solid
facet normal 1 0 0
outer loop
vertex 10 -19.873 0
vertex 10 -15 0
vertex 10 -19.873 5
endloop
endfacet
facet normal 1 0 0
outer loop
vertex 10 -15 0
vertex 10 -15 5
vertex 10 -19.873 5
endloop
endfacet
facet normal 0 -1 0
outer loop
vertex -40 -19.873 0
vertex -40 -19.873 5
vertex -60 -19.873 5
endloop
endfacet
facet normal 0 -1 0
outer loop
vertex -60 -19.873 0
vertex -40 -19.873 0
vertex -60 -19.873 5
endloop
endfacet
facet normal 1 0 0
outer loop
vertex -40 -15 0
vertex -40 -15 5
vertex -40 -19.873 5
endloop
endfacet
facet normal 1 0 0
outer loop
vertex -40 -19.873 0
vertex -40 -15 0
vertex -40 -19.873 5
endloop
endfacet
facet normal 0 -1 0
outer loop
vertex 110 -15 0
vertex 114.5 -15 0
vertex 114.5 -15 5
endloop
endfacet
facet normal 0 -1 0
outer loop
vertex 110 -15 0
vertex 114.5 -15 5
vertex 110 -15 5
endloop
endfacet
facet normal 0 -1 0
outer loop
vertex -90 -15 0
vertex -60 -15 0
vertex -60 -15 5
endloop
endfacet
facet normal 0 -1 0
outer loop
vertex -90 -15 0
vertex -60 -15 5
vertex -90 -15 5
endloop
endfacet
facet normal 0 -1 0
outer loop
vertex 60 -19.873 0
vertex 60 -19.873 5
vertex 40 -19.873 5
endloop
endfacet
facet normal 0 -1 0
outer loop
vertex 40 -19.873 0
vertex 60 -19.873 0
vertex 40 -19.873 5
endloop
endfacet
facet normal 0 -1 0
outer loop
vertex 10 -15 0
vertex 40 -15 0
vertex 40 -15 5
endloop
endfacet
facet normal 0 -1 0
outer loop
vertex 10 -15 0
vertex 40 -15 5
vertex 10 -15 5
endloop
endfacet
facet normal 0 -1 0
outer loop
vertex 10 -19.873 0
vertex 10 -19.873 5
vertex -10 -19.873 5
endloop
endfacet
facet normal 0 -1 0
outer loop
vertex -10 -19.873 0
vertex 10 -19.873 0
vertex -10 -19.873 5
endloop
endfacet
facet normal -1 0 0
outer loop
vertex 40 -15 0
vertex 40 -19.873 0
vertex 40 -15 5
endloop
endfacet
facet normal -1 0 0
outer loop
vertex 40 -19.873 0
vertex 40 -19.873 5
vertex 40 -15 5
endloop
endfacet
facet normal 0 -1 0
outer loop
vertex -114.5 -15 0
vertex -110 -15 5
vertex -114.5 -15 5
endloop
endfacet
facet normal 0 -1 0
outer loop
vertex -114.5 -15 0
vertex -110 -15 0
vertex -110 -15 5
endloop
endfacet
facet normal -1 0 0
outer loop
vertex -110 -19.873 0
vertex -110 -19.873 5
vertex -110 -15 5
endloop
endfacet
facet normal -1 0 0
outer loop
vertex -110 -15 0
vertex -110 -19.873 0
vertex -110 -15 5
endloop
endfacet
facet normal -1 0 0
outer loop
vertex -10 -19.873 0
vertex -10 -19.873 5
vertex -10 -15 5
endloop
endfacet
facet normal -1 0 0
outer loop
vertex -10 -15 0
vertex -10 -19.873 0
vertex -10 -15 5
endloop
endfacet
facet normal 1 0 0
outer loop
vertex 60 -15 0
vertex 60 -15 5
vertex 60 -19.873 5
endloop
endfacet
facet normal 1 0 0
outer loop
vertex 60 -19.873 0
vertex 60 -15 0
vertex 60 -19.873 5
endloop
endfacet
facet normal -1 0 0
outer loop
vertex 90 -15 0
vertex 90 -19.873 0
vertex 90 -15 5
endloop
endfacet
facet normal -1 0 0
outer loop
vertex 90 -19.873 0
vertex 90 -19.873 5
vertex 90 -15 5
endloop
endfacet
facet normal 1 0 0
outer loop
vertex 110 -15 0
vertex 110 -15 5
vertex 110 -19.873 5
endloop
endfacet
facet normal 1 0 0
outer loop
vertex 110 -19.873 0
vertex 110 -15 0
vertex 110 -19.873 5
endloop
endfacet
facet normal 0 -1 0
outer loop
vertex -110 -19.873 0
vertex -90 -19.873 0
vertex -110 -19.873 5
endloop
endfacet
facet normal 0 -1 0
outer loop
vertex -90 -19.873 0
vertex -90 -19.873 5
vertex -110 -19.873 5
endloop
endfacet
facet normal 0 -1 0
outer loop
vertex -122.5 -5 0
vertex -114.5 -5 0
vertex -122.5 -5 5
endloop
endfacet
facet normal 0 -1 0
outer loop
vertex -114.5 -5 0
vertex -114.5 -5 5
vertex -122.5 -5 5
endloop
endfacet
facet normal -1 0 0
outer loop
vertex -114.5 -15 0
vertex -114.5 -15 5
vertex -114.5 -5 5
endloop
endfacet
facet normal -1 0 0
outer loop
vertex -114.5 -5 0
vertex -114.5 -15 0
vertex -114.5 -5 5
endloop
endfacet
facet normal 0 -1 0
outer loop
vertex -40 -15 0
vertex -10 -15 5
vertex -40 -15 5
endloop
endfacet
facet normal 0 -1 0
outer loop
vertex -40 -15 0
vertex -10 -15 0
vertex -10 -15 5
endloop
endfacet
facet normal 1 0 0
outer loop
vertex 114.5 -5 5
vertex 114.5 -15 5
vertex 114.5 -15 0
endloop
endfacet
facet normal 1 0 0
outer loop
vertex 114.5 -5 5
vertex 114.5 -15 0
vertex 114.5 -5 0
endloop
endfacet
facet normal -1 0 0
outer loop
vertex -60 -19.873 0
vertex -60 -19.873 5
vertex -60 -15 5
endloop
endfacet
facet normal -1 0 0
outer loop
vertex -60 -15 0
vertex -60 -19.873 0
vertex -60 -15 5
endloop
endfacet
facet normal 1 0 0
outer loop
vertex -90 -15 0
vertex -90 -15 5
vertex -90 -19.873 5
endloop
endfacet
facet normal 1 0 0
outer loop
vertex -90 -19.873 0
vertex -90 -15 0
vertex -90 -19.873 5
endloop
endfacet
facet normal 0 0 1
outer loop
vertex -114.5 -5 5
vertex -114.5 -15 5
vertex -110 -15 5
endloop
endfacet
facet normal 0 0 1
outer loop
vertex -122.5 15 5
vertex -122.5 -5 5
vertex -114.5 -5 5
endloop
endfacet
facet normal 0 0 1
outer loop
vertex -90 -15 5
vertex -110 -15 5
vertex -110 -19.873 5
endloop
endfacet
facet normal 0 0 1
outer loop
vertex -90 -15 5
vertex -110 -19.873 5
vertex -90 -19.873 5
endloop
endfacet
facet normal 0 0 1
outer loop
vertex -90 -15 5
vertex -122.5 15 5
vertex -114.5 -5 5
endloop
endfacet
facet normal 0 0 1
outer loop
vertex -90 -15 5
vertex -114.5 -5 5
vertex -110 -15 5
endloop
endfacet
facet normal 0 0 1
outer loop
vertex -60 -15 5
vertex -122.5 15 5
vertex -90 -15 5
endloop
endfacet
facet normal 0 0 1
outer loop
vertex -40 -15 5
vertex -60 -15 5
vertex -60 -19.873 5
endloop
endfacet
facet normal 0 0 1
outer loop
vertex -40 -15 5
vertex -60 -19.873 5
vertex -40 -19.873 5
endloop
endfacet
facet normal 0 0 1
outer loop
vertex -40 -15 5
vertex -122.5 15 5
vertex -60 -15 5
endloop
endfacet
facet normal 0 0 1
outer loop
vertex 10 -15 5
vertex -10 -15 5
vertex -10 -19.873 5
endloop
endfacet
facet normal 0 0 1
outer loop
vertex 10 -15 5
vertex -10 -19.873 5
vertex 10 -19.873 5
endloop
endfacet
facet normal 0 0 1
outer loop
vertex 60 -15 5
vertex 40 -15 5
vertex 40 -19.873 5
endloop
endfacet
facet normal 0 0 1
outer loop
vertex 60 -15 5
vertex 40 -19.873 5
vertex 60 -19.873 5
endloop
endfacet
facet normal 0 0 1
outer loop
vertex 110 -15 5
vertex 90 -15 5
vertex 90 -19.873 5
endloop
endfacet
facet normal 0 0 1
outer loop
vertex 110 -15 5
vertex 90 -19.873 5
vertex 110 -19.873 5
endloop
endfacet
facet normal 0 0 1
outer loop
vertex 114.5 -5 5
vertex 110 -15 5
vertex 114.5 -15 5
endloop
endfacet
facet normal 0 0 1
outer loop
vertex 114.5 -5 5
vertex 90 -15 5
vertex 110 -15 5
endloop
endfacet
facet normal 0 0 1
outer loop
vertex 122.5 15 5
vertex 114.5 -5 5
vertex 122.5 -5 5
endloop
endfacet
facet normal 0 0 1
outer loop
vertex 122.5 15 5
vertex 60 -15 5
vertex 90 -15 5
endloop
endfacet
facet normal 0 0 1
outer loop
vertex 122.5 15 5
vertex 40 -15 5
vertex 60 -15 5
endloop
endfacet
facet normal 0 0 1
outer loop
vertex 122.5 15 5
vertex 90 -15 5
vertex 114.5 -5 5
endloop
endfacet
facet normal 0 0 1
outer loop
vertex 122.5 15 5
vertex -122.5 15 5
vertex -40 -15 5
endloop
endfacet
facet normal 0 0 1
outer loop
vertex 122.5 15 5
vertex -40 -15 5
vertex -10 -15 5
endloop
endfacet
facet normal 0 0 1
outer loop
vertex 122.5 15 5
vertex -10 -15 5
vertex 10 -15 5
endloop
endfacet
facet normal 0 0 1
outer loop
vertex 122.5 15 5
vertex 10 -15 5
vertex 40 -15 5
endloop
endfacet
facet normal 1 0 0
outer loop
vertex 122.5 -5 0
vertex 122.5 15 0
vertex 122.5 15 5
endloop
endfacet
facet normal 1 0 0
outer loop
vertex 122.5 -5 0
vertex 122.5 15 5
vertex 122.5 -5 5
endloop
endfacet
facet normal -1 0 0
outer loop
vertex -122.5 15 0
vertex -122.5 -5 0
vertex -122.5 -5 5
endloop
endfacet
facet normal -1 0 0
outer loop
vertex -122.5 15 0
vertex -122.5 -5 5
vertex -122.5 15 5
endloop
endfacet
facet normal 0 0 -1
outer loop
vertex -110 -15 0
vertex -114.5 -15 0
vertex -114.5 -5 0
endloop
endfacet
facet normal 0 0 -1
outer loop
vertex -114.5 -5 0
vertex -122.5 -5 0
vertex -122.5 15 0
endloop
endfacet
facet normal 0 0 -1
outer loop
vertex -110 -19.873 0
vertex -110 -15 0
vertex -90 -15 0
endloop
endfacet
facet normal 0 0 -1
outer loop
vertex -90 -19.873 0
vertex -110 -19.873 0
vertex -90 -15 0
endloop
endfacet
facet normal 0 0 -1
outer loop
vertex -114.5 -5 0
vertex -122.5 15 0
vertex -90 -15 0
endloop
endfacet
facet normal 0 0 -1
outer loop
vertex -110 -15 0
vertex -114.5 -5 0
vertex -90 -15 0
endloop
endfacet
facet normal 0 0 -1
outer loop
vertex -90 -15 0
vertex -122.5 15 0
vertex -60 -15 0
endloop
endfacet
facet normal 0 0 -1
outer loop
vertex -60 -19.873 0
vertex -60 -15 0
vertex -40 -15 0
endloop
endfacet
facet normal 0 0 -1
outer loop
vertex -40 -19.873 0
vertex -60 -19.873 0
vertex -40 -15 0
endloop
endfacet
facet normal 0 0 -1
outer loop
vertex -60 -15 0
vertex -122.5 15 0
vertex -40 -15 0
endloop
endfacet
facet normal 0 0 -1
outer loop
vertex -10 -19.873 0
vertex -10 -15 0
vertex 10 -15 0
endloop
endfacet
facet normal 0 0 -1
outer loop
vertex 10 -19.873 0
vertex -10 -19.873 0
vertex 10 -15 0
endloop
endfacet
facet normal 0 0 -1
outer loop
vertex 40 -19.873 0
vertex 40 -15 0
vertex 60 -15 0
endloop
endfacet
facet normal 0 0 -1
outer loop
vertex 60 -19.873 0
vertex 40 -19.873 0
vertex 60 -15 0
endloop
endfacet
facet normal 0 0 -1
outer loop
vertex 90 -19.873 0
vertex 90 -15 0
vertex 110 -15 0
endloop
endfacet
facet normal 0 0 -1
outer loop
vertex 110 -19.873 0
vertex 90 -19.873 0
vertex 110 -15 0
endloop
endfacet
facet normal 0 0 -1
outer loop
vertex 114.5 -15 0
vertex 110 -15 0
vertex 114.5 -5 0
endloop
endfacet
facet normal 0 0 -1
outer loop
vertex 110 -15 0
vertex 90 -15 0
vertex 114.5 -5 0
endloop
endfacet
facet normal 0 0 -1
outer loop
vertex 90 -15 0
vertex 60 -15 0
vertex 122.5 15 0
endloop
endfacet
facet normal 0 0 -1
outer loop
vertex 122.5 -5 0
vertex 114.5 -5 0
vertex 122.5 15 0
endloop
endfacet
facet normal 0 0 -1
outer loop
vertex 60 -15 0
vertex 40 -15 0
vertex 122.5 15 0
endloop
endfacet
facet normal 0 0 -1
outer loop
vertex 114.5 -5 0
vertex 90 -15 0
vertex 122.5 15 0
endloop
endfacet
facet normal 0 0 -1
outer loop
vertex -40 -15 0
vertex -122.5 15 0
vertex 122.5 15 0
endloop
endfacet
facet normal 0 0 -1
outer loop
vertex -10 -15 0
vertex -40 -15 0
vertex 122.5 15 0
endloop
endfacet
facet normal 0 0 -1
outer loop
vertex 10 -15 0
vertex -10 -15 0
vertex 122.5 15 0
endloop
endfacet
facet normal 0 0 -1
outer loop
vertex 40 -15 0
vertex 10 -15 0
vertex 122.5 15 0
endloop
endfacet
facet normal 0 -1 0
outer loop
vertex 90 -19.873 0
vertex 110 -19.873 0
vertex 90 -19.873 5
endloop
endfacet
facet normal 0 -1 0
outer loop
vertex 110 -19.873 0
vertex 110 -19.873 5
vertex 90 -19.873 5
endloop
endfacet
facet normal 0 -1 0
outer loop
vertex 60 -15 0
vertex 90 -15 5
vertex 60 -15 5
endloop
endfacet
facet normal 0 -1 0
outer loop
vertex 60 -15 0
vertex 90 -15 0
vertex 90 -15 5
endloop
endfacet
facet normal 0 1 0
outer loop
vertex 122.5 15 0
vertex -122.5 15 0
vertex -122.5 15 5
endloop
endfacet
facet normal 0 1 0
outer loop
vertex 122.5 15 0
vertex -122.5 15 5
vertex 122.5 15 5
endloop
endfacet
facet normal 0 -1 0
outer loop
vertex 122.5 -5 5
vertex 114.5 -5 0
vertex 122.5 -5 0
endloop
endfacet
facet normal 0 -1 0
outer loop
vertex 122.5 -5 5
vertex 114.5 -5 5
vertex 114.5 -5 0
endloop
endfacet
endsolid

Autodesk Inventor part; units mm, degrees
ref_plane "YZ Plane" through (0, 0, 0) normal (1, 0, 0) x (0, 1, 0)
ref_plane "XZ Plane" through (0, 0, 0) normal (0, 1, 0) x (-1, 0, 0)
ref_plane "XY Plane" through (0, 0, 0) normal (0, 0, 1) x (1, 0, 0)
sketch "Sketch1" plane through (0, 0, 0) normal (0, 0, 1) x (1, 0, 0)
  line L0 (-122.5, 15) -> (122.5, 15)
  line L1 (122.5, 15) -> (122.5, -15)
  line L2 (122.5, -15) -> (-122.5, -15)
  line L3 (-122.5, -15) -> (-122.5, 15)
  line L4 (-122.5, 15) -> (122.5, -15) construction
  line L5 (122.5, 15) -> (-122.5, -15) construction
  point P0 (0, 0)
  dimension "d0" = 30
  dimension "d1" = 245
extrude "Extrusion1" add sketch "Sketch1" along normal blind 5
sketch "Sketch2" plane through (0, 0, 5) normal (0, 0, 1) x (1, 0, 0)
  line L0 (-110, -14.8732) -> (-90, -14.8732)
  line L1 (-90, -14.8732) -> (-90, -19.8732)
  line L2 (-90, -19.8732) -> (-110, -19.8732)
  line L3 (-110, -19.8732) -> (-110, -14.8732)
  line L4 (-122.5, 15) -> (-122.5, -15) projected
  line L5 (-60, -14.8732) -> (-40, -14.8732)
  line L6 (-40, -14.8732) -> (-40, -19.8732)
  line L7 (-40, -19.8732) -> (-60, -19.8732)
  line L8 (-60, -19.8732) -> (-60, -14.8732)
  line L9 (-10, -14.8732) -> (10, -14.8732)
  line L10 (10, -14.8732) -> (10, -19.8732)
  line L11 (10, -19.8732) -> (-10, -19.8732)
  line L12 (-10, -19.8732) -> (-10, -14.8732)
  line L13 (40, -14.8732) -> (60, -14.8732)
  line L14 (60, -14.8732) -> (60, -19.8732)
  line L15 (60, -19.8732) -> (40, -19.8732)
  line L16 (40, -19.8732) -> (40, -14.8732)
  line L17 (90, -14.8732) -> (110, -14.8732)
  line L18 (110, -14.8732) -> (110, -19.8732)
  line L19 (110, -19.8732) -> (90, -19.8732)
  line L20 (90, -19.8732) -> (90, -14.8732)
  point P0 (0, 0)
  dimension "d4" = 20
  dimension "d5" = 5
  dimension "d6" = 12.5
  dimension "d9" = 50
extrude "Extrusion2" add sketch "Sketch2" against normal blind 5
sketch "Sketch3" plane through (0, 0, 5) normal (0, 0, 1) x (1, 0, 0)
  line L0 (-122.5, 15) -> (-122.5, -15) projected
  line L1 (-122.5, -15) -> (-114.5, -15)
  line L2 (-114.5, -15) -> (-114.5, -5)
  line L3 (-114.5, -5) -> (-122.5, -5)
  line L4 (-122.5, -5) -> (-122.5, -15)
  line L5 (0, 0) -> (0, -7.9678)
  line L6 (122.5, -15) -> (114.5, -15)
  line L7 (114.5, -15) -> (114.5, -5)
  line L8 (114.5, -5) -> (122.5, -5)
  line L9 (122.5, -5) -> (122.5, -15)
  dimension "d18" = 8
  dimension "d19" = 10
extrude "Extrusion3" cut sketch "Sketch3" against normal blind 5
properties part number "Divisória-24cm"
